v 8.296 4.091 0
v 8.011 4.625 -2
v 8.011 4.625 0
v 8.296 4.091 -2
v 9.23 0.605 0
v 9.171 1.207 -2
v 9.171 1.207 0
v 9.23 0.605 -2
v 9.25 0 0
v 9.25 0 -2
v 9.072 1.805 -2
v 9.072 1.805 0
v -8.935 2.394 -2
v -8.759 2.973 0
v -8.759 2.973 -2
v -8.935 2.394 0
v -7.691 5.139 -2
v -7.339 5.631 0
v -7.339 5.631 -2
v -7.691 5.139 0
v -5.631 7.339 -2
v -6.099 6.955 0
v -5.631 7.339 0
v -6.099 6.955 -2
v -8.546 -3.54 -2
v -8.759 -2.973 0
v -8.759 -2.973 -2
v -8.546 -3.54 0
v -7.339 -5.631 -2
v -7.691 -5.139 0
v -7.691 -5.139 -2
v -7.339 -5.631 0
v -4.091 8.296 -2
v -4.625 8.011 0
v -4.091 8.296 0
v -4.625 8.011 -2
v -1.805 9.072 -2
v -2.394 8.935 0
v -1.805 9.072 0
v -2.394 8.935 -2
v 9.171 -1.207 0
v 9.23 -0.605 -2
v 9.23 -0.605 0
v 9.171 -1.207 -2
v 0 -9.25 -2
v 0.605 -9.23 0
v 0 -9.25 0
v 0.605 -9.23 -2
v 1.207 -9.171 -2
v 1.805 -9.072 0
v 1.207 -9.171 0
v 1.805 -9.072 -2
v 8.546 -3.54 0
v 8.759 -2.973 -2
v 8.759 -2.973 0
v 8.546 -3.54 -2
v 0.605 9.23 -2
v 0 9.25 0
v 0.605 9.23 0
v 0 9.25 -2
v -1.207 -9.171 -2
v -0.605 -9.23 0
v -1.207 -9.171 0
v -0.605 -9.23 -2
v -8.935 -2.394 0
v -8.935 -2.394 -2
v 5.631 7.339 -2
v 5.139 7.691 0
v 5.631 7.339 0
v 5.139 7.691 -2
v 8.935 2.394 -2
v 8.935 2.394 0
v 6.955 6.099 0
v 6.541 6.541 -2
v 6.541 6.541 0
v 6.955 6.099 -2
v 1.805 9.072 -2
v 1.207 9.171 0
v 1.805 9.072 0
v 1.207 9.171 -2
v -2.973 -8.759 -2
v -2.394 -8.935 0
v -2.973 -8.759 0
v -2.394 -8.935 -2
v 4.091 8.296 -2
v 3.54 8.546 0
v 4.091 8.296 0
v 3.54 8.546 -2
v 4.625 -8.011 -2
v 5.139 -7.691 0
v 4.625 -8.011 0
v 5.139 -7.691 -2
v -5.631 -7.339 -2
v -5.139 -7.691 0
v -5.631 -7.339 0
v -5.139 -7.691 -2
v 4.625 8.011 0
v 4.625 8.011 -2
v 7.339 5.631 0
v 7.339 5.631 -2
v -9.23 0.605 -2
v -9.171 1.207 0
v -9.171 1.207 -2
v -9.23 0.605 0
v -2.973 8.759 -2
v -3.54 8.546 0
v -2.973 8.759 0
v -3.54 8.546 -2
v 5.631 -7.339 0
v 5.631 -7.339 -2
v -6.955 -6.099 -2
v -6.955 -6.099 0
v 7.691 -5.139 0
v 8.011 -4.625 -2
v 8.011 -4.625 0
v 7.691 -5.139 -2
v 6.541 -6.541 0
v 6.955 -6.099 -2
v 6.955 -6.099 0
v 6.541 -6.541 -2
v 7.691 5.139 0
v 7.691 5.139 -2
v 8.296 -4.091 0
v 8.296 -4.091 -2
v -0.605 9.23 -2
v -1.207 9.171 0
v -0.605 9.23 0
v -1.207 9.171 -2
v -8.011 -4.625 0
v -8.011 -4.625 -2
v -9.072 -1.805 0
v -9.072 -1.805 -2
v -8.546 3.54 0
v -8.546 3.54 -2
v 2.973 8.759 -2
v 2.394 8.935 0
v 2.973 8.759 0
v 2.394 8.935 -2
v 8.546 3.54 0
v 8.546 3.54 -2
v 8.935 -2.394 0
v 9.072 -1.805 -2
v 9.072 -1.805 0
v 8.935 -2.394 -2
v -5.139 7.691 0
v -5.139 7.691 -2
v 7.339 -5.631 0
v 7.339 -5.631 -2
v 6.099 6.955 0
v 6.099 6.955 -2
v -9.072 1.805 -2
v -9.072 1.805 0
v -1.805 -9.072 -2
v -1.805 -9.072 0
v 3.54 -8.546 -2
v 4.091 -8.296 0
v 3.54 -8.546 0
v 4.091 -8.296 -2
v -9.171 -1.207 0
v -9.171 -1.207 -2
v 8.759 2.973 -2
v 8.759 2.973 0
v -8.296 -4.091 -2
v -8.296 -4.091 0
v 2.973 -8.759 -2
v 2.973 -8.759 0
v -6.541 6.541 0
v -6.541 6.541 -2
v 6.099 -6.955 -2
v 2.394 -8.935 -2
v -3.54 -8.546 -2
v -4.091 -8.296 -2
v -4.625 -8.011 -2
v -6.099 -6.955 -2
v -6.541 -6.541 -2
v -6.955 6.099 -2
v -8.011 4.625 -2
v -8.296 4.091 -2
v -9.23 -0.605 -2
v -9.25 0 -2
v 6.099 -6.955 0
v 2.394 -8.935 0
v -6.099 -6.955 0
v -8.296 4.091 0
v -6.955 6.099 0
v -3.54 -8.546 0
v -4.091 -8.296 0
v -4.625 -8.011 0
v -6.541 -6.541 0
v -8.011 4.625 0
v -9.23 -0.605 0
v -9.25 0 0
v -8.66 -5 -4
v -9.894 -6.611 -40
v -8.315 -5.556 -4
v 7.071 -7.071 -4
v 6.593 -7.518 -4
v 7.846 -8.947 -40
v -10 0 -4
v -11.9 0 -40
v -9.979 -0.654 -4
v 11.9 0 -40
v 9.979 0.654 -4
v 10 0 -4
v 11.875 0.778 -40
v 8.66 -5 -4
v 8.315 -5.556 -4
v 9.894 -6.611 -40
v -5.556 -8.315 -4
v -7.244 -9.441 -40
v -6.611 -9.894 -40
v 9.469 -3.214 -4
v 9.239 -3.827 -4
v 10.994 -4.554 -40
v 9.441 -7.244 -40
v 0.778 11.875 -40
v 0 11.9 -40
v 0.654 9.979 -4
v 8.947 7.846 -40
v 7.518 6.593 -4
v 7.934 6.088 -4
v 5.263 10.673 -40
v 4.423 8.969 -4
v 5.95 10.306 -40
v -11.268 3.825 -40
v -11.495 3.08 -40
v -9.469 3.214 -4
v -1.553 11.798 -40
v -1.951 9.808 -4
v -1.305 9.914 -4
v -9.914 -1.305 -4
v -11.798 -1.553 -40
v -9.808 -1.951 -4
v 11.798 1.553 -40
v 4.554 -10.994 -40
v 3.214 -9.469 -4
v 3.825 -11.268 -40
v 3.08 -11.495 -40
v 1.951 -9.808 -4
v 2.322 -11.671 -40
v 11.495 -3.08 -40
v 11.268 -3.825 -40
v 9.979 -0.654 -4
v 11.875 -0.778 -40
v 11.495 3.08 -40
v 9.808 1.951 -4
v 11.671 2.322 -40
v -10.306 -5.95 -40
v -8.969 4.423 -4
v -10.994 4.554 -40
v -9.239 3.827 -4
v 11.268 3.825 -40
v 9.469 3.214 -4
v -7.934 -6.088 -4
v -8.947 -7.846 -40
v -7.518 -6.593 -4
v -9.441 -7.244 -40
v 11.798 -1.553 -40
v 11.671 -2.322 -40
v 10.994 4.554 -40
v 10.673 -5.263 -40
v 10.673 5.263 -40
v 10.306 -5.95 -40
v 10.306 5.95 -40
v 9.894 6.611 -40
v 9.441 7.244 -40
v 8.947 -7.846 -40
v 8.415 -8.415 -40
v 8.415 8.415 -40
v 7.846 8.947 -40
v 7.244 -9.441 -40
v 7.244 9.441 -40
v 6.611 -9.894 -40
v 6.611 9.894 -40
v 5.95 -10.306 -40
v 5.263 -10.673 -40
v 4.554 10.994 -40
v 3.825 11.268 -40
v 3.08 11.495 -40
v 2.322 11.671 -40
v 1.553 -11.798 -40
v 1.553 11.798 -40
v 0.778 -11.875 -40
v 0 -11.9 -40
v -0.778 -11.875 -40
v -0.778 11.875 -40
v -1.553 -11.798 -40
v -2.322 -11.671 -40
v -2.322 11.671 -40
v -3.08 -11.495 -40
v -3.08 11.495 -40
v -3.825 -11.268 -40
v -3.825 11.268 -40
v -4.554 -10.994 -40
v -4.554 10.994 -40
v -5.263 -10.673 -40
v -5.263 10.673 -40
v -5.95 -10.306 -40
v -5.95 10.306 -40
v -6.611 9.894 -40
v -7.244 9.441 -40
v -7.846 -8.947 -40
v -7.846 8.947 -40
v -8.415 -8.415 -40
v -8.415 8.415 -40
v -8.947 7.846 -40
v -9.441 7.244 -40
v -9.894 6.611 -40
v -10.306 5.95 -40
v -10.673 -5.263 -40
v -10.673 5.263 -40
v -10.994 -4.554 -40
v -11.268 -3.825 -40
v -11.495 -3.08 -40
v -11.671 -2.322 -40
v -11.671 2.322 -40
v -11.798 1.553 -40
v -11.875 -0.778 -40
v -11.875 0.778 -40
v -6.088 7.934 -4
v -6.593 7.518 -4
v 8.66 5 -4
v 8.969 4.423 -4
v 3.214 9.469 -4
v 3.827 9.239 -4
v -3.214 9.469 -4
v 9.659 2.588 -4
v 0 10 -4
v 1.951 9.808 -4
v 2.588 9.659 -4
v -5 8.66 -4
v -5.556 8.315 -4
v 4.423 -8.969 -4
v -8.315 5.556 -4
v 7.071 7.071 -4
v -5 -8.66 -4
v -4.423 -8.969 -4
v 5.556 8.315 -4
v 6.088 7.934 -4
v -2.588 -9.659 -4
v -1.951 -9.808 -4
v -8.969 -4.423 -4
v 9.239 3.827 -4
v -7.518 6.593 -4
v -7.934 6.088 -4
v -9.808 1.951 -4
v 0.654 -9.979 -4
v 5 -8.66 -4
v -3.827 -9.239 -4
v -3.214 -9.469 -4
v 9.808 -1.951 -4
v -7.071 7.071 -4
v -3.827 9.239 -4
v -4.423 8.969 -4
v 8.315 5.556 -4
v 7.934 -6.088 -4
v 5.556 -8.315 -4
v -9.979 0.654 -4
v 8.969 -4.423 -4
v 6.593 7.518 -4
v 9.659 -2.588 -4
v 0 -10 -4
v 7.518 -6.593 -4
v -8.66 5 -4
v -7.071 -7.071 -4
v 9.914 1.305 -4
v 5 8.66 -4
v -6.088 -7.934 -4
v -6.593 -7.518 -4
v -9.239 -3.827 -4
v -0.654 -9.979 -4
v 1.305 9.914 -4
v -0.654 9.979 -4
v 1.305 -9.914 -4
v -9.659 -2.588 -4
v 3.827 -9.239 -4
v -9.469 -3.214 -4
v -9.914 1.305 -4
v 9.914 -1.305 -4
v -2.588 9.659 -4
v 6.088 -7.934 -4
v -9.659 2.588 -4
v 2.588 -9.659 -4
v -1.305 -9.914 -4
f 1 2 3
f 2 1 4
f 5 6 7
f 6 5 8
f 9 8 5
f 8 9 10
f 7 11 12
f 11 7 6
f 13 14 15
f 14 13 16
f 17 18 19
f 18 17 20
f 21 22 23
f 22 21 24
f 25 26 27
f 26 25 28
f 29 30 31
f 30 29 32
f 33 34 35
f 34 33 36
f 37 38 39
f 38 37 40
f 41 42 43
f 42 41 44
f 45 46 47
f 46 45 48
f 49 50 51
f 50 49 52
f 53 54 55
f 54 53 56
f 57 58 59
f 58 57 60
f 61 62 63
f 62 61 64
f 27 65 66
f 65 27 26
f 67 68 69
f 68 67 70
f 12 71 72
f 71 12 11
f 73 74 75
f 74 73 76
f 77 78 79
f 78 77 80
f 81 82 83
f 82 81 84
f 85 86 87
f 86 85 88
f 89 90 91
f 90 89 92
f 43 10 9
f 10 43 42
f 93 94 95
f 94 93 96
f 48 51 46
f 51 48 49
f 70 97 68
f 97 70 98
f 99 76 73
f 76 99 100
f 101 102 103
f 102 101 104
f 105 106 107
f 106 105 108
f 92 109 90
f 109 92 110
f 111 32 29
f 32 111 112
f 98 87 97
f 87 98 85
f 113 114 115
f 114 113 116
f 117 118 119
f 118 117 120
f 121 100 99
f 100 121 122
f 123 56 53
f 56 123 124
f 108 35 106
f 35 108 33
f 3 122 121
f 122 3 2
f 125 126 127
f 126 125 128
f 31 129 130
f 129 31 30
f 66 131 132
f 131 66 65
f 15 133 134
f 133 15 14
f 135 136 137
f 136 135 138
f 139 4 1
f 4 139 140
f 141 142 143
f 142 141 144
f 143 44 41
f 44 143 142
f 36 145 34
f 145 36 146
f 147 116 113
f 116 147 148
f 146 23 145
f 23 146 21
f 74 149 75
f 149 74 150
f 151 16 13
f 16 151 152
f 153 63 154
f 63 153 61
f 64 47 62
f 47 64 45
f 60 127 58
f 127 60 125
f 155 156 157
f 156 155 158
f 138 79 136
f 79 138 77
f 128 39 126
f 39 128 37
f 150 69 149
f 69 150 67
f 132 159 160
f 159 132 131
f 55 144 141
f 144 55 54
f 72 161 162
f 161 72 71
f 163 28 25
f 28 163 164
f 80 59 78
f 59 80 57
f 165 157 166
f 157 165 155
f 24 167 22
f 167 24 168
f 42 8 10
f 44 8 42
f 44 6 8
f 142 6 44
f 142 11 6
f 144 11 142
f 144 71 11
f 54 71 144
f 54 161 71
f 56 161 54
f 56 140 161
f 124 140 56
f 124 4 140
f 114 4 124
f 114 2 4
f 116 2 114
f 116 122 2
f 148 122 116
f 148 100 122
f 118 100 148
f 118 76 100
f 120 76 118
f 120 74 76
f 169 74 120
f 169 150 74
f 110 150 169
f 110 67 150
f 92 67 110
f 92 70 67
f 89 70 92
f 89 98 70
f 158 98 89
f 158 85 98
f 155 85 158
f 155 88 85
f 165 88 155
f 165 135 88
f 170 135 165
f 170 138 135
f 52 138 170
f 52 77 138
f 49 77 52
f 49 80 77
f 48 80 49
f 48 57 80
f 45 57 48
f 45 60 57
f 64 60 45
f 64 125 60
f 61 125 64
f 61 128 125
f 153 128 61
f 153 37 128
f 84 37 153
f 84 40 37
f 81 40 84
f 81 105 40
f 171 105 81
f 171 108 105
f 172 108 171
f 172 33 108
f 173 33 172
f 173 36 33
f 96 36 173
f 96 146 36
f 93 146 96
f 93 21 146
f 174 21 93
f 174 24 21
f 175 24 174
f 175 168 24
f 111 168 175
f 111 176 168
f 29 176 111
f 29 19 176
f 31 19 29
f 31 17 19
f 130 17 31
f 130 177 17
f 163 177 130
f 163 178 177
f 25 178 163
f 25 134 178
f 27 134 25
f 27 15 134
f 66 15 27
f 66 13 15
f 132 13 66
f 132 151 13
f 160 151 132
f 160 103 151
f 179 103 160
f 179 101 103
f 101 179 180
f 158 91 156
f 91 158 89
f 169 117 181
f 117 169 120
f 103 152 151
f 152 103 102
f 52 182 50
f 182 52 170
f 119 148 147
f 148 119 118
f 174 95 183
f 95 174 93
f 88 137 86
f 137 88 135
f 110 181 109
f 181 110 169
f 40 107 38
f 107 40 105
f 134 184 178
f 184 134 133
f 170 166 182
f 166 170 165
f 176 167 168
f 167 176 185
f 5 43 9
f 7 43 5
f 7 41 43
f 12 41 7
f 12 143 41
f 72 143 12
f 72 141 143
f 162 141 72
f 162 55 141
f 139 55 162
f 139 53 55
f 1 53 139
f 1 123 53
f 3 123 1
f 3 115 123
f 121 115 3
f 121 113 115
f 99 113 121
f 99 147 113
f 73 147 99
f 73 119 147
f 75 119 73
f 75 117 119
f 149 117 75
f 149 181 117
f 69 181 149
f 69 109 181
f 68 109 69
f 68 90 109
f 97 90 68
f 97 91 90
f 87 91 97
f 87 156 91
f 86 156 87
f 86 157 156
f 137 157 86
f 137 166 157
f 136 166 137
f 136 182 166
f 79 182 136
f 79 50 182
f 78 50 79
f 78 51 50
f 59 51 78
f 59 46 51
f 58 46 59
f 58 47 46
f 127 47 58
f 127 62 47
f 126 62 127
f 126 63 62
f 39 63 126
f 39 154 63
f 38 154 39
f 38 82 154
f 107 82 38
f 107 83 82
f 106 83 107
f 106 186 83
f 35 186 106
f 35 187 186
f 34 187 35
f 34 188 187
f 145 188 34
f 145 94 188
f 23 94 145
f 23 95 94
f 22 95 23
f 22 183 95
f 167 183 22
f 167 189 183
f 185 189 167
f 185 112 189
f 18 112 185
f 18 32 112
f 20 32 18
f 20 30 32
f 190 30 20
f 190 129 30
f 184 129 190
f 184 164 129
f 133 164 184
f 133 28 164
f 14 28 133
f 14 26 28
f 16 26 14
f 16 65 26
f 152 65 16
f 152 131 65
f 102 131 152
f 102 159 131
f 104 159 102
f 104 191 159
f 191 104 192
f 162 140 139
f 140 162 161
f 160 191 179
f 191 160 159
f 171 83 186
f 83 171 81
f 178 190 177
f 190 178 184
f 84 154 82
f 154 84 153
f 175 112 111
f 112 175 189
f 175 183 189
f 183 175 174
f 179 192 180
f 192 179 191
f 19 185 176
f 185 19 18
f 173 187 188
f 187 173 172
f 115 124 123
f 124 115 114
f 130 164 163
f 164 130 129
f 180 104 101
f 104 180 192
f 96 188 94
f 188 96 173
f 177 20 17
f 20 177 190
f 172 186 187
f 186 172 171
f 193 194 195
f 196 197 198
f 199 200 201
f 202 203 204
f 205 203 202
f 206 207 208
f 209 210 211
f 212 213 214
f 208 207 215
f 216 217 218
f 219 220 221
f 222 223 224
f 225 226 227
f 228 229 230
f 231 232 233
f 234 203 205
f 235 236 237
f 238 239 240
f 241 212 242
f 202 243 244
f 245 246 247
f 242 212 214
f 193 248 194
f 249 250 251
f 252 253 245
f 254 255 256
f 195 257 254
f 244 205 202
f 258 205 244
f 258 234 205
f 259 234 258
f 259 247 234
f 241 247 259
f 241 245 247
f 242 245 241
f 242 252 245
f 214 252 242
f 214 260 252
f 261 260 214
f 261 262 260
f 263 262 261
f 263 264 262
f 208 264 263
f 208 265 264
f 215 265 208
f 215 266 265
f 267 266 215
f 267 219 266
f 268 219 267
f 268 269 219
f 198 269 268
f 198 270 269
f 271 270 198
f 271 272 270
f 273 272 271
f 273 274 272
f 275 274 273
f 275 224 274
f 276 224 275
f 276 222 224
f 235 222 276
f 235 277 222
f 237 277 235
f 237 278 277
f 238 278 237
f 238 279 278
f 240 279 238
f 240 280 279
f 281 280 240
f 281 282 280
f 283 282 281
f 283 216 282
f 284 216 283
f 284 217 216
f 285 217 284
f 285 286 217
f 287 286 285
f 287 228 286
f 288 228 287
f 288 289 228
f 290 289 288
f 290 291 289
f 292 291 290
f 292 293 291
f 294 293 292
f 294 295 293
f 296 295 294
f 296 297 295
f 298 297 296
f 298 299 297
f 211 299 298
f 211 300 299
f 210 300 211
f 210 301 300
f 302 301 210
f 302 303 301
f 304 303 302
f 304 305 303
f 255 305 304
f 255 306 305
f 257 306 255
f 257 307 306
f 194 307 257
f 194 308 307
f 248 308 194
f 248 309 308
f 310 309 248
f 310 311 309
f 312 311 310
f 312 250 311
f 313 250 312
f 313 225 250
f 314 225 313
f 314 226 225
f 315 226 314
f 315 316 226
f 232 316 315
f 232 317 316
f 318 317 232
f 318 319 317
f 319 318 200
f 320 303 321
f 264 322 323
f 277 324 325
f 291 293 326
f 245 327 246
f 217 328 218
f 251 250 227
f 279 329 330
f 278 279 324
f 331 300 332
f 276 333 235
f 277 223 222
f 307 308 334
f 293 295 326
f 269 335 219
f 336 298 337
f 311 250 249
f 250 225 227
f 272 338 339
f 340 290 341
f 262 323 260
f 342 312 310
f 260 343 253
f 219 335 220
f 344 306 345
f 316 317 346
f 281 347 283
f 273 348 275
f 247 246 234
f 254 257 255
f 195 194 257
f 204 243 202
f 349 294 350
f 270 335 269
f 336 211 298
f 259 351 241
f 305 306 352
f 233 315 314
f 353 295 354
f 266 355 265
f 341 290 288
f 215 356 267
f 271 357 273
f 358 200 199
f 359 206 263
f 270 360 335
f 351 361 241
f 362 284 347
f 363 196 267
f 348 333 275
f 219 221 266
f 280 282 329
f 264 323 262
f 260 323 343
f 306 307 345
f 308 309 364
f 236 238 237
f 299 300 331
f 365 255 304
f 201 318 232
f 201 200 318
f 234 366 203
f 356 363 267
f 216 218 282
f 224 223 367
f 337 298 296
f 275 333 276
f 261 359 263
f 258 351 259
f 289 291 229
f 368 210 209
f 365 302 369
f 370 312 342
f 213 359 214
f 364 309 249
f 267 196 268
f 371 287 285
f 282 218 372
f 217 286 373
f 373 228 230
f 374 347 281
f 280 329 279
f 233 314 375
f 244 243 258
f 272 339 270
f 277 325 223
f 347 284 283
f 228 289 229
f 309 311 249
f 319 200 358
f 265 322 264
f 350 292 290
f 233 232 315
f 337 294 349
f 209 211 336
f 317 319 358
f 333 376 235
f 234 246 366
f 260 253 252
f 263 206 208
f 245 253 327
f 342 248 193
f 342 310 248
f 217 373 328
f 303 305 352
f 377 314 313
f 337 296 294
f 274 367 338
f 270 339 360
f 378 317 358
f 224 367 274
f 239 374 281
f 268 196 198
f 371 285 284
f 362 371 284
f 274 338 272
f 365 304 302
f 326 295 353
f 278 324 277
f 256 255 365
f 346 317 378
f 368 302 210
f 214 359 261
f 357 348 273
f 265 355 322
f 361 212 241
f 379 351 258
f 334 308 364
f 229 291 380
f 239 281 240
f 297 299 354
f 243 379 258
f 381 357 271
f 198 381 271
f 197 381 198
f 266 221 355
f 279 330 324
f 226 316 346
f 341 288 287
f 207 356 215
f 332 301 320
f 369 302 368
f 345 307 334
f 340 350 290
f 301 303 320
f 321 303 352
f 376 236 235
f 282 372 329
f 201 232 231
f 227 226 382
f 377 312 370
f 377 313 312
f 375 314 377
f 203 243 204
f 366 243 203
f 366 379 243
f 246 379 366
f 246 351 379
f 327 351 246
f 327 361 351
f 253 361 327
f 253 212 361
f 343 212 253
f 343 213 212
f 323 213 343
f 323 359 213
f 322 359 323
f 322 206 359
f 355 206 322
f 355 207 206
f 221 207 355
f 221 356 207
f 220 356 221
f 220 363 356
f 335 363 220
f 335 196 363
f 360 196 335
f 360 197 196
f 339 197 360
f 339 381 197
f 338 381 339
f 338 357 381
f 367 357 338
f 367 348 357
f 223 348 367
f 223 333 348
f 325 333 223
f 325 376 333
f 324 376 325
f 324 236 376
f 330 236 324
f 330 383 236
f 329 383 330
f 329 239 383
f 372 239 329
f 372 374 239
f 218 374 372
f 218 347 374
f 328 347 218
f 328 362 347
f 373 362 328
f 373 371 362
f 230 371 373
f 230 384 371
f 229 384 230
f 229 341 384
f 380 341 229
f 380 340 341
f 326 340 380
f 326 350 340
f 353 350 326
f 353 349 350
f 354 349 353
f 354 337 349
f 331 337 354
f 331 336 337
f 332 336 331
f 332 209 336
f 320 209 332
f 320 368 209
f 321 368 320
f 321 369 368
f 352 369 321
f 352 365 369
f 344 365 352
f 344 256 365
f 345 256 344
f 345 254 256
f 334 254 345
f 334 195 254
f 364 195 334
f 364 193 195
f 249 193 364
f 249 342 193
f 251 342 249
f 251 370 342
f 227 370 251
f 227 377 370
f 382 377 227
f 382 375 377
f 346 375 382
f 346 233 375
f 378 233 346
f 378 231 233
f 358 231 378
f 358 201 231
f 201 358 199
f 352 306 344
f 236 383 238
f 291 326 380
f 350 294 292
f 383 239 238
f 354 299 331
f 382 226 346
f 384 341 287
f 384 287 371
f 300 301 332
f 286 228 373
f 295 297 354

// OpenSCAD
group() {
									multmatrix([[1, 0, 0, 0], [0, 1, 0, 0], [0, 0, 1, -1], [0, 0, 0, 1]]) {
										cylinder($fn = 96, $fa = 12, $fs = 2, h = 2, r1 = 9.25, r2 = 9.25, center = true);
									}
									multmatrix([[1, 0, 0, 0], [0, 1, 0, 0], [0, 0, 1, -22], [0, 0, 0, 1]]) {
										cylinder($fn = 96, $fa = 12, $fs = 2, h = 36, r1 = 11.9, r2 = 10, center = true);
									}
                                }
